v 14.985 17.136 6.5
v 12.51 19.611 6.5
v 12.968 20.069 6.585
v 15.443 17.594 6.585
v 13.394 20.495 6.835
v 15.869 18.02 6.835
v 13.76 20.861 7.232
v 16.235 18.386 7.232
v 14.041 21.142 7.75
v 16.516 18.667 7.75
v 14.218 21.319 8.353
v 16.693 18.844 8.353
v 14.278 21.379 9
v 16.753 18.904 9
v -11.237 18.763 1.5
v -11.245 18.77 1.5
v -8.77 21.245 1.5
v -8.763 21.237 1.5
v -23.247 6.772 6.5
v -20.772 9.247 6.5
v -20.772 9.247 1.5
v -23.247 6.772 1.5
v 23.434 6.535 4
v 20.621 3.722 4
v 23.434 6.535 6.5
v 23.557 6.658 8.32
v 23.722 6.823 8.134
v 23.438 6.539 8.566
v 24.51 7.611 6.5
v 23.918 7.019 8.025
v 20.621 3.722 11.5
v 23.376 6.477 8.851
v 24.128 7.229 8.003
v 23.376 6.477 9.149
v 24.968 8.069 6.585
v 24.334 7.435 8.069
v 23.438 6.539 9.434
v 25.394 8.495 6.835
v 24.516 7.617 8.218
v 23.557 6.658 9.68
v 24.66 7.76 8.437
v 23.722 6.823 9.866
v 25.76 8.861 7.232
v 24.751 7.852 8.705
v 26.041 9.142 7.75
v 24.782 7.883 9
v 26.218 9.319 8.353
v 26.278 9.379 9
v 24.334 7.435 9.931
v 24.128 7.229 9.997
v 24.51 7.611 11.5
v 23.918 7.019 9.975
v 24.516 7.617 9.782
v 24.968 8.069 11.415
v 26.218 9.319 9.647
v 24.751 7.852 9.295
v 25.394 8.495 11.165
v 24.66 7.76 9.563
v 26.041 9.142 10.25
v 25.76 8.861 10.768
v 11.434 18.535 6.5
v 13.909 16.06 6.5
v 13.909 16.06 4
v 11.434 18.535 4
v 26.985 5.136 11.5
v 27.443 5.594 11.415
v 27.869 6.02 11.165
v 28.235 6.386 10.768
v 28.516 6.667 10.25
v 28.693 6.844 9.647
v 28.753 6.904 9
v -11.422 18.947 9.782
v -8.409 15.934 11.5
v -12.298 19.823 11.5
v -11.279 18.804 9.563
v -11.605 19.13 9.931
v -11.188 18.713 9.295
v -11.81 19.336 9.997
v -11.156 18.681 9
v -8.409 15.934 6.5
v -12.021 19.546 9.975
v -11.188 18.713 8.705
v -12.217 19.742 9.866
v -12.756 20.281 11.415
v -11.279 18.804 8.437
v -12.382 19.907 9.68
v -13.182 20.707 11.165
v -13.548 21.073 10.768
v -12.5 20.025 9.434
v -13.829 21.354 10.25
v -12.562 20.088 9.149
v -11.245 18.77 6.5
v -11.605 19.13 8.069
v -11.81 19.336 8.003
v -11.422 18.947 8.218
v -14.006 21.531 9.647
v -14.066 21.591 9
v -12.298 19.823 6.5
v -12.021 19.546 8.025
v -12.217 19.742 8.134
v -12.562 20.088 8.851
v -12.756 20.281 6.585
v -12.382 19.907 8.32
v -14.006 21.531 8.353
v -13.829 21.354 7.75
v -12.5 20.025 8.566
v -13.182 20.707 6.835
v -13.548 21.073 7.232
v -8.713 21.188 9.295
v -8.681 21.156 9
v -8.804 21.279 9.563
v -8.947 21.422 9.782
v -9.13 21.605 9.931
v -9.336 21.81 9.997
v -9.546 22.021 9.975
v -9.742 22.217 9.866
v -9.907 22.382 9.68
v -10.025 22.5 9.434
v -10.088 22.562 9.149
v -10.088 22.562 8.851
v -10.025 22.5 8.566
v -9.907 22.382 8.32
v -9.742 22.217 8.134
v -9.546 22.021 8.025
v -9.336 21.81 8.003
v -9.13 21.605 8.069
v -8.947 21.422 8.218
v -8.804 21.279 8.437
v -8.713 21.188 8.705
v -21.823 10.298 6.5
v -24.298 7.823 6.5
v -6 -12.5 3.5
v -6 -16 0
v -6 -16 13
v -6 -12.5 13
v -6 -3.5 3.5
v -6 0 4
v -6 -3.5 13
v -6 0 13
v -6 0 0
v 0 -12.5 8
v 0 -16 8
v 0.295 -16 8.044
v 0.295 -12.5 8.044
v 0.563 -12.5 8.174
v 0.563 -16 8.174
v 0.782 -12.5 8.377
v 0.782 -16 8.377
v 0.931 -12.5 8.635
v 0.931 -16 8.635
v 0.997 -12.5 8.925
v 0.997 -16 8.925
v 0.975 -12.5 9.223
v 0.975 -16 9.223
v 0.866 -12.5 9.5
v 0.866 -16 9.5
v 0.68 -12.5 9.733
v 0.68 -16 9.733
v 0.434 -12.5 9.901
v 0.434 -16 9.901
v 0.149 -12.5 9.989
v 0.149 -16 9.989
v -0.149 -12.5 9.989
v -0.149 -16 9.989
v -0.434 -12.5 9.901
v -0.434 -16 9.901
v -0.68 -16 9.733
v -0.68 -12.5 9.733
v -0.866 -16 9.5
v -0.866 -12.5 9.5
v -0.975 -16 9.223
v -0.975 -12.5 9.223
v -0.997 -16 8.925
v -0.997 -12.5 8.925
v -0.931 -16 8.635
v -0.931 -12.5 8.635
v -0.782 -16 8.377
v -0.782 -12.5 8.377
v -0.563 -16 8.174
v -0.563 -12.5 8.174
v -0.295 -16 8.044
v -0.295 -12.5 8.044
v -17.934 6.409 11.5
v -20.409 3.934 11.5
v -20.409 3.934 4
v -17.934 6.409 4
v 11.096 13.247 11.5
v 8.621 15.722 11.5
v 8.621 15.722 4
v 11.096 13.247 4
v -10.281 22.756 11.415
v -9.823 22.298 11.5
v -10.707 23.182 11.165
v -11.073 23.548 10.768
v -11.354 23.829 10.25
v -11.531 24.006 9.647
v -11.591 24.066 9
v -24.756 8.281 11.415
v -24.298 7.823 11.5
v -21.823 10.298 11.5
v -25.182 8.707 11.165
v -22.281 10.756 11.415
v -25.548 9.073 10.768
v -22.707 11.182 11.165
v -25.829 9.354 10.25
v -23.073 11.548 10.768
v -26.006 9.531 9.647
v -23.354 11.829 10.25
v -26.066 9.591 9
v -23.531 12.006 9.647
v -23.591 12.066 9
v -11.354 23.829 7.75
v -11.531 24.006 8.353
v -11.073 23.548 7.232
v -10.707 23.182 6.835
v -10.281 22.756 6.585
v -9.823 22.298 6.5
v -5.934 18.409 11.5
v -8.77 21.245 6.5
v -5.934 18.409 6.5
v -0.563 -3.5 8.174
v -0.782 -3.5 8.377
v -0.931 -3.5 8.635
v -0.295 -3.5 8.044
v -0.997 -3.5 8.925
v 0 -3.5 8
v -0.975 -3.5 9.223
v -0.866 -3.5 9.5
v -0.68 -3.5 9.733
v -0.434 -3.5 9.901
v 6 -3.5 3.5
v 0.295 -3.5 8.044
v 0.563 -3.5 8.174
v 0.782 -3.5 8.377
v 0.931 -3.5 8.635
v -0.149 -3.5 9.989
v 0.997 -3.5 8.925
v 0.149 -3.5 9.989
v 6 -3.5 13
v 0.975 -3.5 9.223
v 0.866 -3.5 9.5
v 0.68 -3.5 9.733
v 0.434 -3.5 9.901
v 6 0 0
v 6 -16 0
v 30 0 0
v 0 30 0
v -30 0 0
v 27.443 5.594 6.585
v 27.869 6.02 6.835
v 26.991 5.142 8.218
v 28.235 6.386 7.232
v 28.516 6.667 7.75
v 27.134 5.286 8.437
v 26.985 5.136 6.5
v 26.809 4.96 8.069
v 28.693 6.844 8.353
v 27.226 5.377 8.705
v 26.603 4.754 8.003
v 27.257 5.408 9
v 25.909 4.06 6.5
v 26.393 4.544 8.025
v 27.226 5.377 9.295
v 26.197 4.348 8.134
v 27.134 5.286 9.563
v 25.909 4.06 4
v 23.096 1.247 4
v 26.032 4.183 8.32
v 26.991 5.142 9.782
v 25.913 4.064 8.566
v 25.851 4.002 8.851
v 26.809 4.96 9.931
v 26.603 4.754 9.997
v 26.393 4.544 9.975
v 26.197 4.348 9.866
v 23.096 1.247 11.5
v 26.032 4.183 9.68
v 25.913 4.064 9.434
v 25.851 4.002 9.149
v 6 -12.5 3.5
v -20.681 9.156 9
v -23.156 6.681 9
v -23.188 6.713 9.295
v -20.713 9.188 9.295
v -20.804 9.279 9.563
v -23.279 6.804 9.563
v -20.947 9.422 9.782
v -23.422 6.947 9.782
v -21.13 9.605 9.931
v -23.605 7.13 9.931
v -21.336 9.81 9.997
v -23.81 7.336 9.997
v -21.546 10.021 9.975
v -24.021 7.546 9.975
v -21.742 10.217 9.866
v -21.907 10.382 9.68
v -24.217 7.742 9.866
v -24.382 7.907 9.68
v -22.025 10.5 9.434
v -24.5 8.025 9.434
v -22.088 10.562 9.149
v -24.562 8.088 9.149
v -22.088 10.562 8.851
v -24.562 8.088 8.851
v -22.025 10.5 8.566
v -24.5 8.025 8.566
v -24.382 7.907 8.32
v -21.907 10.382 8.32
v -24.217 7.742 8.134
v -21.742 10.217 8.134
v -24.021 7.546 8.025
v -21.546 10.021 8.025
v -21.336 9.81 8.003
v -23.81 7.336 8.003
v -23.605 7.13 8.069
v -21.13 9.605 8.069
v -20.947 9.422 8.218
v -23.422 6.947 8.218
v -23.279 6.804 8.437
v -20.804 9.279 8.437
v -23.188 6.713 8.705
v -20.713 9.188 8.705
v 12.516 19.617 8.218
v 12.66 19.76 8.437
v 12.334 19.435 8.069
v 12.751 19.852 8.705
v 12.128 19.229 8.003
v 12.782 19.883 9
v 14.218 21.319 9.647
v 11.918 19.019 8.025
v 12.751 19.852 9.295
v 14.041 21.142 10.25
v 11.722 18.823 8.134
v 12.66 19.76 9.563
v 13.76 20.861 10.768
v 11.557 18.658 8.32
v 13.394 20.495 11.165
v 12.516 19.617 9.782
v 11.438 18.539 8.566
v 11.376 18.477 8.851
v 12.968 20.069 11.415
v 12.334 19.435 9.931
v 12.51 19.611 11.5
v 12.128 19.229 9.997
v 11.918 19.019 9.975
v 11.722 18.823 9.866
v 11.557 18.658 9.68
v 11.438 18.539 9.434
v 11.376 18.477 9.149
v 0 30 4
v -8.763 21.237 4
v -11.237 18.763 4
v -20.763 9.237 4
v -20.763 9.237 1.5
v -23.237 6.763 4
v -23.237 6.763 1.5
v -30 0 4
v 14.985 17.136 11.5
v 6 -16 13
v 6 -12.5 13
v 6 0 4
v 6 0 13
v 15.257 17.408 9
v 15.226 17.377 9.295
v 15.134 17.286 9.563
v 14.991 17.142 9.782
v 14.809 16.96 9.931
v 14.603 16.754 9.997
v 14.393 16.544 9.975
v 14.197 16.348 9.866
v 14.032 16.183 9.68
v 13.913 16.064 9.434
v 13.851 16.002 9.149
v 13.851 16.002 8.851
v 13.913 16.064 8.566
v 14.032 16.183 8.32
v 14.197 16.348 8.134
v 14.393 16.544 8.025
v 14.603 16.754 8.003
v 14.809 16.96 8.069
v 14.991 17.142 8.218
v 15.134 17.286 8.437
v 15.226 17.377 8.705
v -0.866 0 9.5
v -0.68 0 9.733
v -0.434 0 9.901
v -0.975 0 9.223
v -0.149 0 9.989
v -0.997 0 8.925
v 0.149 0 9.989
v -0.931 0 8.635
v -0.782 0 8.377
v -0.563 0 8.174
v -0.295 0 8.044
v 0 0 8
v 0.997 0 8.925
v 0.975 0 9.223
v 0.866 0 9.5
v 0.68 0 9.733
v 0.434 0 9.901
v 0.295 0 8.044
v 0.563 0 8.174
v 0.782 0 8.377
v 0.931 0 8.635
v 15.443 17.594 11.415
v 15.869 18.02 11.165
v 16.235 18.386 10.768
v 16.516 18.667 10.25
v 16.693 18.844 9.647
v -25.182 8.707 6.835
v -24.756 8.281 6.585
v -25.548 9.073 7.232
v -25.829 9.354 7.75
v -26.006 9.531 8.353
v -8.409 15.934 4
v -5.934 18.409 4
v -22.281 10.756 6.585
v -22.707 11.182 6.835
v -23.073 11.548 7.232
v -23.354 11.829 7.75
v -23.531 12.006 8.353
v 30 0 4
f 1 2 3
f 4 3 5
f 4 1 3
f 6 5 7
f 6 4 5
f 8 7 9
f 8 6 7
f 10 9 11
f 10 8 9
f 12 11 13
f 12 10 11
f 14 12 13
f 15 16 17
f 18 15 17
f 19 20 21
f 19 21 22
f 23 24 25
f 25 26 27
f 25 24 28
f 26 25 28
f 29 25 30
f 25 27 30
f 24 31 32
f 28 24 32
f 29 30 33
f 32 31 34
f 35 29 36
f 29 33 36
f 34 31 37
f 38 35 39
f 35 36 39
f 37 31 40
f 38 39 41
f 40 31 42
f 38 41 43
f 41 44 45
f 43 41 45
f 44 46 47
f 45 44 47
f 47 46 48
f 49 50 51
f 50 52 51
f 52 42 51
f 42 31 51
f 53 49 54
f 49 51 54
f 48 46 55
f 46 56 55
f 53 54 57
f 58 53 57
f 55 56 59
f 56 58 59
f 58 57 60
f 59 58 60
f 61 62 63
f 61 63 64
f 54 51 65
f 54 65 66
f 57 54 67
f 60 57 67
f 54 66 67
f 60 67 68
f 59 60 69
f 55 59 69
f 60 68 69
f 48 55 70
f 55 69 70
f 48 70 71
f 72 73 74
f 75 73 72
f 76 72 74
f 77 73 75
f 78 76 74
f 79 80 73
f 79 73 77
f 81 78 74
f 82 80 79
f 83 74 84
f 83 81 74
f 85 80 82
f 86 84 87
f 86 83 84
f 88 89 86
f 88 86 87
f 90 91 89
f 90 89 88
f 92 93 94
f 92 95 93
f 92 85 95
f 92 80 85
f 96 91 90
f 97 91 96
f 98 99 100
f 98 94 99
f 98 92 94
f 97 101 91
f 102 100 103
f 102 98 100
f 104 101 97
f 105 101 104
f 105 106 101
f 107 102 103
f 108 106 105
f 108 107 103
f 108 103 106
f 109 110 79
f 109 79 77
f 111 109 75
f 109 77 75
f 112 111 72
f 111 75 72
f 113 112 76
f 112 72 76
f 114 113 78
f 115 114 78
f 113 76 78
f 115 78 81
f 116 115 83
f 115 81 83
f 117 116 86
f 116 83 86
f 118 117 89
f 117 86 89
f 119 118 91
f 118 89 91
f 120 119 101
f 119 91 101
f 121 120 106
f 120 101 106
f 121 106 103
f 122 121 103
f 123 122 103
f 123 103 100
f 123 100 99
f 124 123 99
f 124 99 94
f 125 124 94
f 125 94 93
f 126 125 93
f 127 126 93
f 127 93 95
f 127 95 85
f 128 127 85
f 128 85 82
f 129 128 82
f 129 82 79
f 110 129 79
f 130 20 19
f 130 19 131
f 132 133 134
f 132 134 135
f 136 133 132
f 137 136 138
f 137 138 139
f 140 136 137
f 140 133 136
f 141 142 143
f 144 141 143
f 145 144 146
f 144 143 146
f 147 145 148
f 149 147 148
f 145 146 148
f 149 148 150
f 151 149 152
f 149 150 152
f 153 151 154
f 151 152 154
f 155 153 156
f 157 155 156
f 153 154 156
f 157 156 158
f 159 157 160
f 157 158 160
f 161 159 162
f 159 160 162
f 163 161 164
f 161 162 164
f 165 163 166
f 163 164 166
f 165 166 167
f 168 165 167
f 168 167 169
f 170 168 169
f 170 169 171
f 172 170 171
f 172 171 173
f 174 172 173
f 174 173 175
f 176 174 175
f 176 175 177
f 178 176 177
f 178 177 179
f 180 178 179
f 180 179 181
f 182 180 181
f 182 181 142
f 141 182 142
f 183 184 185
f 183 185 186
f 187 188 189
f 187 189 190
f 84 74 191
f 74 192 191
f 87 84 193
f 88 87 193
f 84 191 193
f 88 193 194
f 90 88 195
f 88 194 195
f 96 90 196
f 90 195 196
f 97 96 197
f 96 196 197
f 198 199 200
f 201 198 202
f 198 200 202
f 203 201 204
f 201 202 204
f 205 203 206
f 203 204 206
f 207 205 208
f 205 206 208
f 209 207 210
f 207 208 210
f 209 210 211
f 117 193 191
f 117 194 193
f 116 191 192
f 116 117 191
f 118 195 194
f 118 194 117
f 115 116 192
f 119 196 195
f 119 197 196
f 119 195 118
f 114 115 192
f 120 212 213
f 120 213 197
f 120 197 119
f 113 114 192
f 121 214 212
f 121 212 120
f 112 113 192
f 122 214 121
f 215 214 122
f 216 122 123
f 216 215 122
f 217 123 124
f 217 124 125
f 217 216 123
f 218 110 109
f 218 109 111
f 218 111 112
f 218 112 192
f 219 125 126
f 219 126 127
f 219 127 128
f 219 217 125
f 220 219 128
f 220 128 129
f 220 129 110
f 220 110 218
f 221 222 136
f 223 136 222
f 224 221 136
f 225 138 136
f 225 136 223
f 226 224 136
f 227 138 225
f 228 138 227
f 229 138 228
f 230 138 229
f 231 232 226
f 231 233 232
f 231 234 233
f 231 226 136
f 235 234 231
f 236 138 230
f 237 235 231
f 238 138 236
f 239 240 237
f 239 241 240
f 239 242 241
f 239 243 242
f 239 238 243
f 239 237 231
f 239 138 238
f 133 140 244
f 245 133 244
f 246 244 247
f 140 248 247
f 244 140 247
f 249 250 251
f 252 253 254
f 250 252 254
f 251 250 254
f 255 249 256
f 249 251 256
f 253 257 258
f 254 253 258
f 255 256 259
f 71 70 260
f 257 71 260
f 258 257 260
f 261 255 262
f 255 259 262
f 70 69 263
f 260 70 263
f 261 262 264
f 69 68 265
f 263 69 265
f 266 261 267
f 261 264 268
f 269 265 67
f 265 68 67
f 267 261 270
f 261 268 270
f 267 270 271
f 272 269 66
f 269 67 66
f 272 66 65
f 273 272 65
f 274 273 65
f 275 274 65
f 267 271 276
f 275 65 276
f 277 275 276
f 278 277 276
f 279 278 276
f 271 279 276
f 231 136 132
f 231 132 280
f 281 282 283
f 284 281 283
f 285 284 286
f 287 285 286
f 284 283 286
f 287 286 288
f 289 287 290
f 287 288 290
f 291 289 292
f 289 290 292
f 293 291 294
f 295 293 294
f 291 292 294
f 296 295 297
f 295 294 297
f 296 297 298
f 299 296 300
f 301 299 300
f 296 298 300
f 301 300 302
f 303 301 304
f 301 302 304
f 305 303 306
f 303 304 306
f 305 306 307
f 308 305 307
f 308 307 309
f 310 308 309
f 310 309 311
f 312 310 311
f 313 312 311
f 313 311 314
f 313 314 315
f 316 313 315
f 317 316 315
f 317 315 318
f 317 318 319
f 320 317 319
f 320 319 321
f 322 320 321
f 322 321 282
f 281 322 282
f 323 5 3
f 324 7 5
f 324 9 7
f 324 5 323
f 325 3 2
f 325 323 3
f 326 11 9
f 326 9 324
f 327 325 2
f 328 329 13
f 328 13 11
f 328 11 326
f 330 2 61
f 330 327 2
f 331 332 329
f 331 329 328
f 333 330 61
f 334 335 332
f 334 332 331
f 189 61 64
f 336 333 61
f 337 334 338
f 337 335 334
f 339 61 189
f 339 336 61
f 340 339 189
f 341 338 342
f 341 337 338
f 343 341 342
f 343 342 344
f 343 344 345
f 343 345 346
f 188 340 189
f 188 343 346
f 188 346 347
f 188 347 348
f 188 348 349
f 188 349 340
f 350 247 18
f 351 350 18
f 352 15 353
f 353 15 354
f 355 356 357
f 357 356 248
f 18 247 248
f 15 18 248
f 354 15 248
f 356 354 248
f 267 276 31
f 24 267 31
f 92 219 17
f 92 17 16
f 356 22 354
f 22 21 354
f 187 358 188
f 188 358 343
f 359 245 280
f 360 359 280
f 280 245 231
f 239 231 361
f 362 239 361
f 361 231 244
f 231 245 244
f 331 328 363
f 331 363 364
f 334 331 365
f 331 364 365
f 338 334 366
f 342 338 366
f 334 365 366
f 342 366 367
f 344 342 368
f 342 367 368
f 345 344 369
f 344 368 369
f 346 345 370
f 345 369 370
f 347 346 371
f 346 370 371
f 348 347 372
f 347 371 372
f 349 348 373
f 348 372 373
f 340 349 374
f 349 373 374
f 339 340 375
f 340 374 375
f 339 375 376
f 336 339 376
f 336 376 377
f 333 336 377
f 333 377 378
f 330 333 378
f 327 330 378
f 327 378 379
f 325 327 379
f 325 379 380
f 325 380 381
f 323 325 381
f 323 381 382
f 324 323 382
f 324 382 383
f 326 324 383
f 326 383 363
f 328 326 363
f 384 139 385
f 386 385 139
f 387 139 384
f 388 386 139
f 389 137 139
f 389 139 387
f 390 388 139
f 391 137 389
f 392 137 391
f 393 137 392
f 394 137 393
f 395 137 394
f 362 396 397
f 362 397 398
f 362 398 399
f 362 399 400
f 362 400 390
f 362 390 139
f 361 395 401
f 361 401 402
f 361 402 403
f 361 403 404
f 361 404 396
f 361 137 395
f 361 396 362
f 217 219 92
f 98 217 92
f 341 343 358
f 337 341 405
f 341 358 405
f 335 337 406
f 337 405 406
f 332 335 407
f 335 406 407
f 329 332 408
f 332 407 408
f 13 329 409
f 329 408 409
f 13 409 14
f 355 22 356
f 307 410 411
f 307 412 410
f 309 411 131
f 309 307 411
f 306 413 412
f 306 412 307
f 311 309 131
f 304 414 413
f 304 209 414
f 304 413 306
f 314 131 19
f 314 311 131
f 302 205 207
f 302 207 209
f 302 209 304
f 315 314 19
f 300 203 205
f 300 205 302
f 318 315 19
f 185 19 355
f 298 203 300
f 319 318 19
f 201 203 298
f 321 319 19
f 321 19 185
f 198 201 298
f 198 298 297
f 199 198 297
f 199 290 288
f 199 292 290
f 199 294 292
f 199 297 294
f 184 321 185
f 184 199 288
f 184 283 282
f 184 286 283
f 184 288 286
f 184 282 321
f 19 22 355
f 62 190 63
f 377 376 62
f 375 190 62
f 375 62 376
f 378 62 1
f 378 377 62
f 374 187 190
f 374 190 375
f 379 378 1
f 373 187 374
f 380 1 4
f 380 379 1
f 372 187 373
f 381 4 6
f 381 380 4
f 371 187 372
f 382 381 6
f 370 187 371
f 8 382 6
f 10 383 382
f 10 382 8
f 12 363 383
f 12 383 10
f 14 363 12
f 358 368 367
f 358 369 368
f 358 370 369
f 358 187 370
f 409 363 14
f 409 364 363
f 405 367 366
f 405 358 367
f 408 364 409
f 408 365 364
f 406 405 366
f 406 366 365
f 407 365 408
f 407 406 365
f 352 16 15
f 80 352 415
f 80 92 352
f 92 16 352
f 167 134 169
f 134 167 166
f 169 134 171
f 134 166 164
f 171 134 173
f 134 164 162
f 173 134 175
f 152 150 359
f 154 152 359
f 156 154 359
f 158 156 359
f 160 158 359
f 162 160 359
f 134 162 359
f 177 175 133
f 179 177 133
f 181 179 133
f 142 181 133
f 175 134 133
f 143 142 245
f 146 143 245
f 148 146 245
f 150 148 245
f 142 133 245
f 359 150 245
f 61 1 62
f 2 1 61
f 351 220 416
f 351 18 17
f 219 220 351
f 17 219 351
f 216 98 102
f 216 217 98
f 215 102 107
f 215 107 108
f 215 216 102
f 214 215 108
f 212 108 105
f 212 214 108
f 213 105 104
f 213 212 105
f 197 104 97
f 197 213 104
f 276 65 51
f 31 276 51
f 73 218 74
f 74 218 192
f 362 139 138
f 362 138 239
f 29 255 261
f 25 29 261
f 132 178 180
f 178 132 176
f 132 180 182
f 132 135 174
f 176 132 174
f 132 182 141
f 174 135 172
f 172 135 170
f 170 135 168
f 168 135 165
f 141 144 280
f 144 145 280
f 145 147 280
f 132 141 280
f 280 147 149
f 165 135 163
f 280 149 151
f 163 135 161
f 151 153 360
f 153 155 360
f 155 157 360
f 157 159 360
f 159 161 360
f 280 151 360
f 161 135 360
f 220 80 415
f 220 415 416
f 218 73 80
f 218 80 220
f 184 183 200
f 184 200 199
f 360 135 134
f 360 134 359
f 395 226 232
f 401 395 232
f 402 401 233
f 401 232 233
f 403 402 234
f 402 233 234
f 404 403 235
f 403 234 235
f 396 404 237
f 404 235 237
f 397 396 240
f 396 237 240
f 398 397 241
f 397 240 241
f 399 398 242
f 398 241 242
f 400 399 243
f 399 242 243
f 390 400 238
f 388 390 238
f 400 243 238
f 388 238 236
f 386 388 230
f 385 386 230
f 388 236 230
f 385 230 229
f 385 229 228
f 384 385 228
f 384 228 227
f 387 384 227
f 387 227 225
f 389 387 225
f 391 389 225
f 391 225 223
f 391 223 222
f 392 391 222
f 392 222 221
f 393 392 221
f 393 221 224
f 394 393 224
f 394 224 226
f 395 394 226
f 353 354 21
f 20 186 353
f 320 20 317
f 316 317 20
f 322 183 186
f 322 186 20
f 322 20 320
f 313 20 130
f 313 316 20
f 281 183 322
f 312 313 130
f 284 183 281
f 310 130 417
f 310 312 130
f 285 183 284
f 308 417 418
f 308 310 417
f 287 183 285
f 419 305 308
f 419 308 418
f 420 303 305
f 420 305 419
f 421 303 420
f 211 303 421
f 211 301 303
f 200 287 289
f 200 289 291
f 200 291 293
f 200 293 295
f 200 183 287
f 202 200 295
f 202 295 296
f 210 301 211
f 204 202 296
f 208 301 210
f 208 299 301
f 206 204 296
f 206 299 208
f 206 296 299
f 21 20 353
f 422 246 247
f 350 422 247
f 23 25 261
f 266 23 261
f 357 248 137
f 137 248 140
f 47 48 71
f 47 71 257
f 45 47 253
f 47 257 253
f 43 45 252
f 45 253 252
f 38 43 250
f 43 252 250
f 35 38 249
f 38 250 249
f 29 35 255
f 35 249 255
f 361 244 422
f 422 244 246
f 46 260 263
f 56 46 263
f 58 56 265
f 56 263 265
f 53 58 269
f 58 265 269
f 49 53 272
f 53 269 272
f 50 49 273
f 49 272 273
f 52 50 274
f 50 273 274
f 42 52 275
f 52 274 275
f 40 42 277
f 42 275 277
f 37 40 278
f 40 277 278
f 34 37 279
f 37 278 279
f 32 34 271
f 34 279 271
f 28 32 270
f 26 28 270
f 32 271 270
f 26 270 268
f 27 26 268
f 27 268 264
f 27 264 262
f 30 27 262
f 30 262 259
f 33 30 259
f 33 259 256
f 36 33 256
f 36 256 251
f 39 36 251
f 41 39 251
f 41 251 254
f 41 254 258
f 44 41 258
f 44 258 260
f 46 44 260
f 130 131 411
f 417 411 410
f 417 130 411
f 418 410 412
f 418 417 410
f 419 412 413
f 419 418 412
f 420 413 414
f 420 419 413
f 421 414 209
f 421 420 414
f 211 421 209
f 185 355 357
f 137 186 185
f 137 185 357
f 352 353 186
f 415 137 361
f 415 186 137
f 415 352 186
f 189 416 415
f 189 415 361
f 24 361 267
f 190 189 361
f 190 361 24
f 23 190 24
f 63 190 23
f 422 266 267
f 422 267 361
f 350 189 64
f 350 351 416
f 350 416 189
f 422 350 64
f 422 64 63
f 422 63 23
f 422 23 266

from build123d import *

# Parameters (mm, degrees)
BOSS_EXTRUDE1_DEPTH   = 4
BOSS_EXTRUDE2_START   = -4
SKETCH2_W             = 12
SKETCH2_H             = 16
BOSS_EXTRUDE2_DEPTH   = 13
SKETCH3_W             = 12
SKETCH3_H             = 9
CUT_EXTRUDE1_DEPTH    = 9.5
SKETCH4_R             = 1
CUT_EXTRUDE2_DEPTH    = 16
BOSS_EXTRUDE3_START   = 2.5
BOSS_EXTRUDE3_DEPTH   = 5
BOSS_EXTRUDE3_2_DEPTH = 5
BOSS_EXTRUDE3_3_DEPTH = 5
BOSS_EXTRUDE3_4_DEPTH = 5
BOSS_EXTRUDE4_DEPTH   = 10
SKETCH6_R             = 1
CUT_EXTRUDE5_DEPTH    = 25
SKETCH7_R             = 1
CUT_EXTRUDE6_DEPTH    = 25
FILLET2_R             = 2.5


with BuildPart() as part:
    # Sketch1 → Boss-Extrude1 (new body)
    with BuildSketch(Plane.XY):
        Polygon((-30, 0), (30, 0), (0, 30), align=None)
    extrude(amount=BOSS_EXTRUDE1_DEPTH)

    # Sketch2 → Boss-Extrude2 (add)
    with BuildSketch(Plane.XY.offset(4).offset(BOSS_EXTRUDE2_START)):
        with Locations((0, -8)):
            Rectangle(SKETCH2_W, SKETCH2_H)
    extrude(amount=BOSS_EXTRUDE2_DEPTH)

    # Sketch3 → Cut-Extrude1 (cut)
    with BuildSketch(Plane.XY.offset(13)):
        with Locations((0, -8)):
            Rectangle(SKETCH3_W, SKETCH3_H)
    extrude(amount=-CUT_EXTRUDE1_DEPTH, mode=Mode.SUBTRACT)

    # Sketch4 → Cut-Extrude2 (cut)
    with BuildSketch(Plane.XZ.offset(16)):
        with Locations(Location((0, 9, 0), (0, 0, 270))):
            Circle(SKETCH4_R)
    extrude(amount=-CUT_EXTRUDE2_DEPTH, mode=Mode.SUBTRACT)



with BuildPart() as body_2:
    # Sketch5 → Boss-Extrude3 (new body)
    with BuildSketch(Plane.XY.offset(4).offset(BOSS_EXTRUDE3_START)):
        Polygon((-8.409009742, 15.934136008), (-14.065863992, 21.590990258), (-11.590990258, 24.065863992), (-5.934136008, 18.409009742), align=None)
    extrude(amount=BOSS_EXTRUDE3_DEPTH)


with BuildPart() as body_3:
    # Sketch5 → Boss-Extrude3 2 (new body)
    with BuildSketch(Plane.XY.offset(4).offset(BOSS_EXTRUDE3_START)):
        Polygon((-20.409009742, 3.934136008), (-26.065863992, 9.590990258), (-23.590990258, 12.065863992), (-17.934136008, 6.409009742), align=None)
    extrude(amount=BOSS_EXTRUDE3_2_DEPTH)


with BuildPart() as body_4:
    # Sketch5 → Boss-Extrude3 3 (new body)
    with BuildSketch(Plane.XY.offset(4).offset(BOSS_EXTRUDE3_START)):
        Polygon((8.621141777, 15.722003974), (14.277996026, 21.378858223), (16.75286976, 18.903984489), (11.096015511, 13.24713024), align=None)
    extrude(amount=BOSS_EXTRUDE3_3_DEPTH)


with BuildPart() as body_5:
    # Sketch5 → Boss-Extrude3 4 (new body)
    with BuildSketch(Plane.XY.offset(4).offset(BOSS_EXTRUDE3_START)):
        Polygon((20.621141777, 3.722003974), (26.277996026, 9.378858223), (28.75286976, 6.903984489), (23.096015511, 1.24713024), align=None)
    extrude(amount=BOSS_EXTRUDE3_4_DEPTH)


with BuildPart() as part_1:
    add(part.part)

    add(body_2.part)  # Boss-Extrude4 merges body 2

    add(body_3.part)  # Boss-Extrude4 merges body 3

    add(body_4.part)  # Boss-Extrude4 merges body 4

    add(body_5.part)  # Boss-Extrude4 merges body 5
    # Sketch8 → Boss-Extrude4 (add)
    with BuildSketch(Plane.XY.offset(11.5)):
        Polygon((-20.409009742, 3.934136008), (-17.934136008, 6.409009742), (-20.77228069, 9.247154424), (-23.247154424, 6.77228069), align=None)
        Polygon((-8.409009742, 15.934136008), (-5.934136008, 18.409009742), (-8.770090905, 21.24496464), (-11.24496464, 18.770090905), align=None)
        Polygon((8.621141777, 15.722003974), (11.096015511, 13.24713024), (13.908555635, 16.059670364), (11.433681901, 18.534544098), align=None)
        Polygon((23.096015511, 1.24713024), (20.621141777, 3.722003974), (23.433669477, 6.534531674), (25.908543211, 4.05965794), align=None)
    extrude(amount=-BOSS_EXTRUDE4_DEPTH)

    # Sketch6 → Cut-Extrude5 (cut)
    with BuildSketch(Plane(origin=(10.924442636, -10.924442636, 0), x_dir=(0.7071067811865506, 0.7071067811865446, 0), z_dir=(0.7071067811865446, -0.7071067811865506, 0))):
        with Locations((22.098203436, 9)):
            Circle(SKETCH6_R)
    extrude(amount=-CUT_EXTRUDE5_DEPTH, mode=Mode.SUBTRACT)

    # Sketch7 → Cut-Extrude6 (cut)
    with BuildSketch(Plane(origin=(-8.237436867, -8.237436867, 0), x_dir=(0, 0, 1), z_dir=(-0.7071067811865501, -0.7071067811865449, 0))):
        with Locations(Location((9, 22.098203436, 0), (0, 0, 270))):
            Circle(SKETCH7_R)
    extrude(amount=-CUT_EXTRUDE6_DEPTH, mode=Mode.SUBTRACT)

    # Fillet2
    fillet2_edges = [part_1.edges().sort_by_distance(p)[0] for p in [
        (15.515432893, 20.141421356, 11.5),
        (15.515432893, 20.141421356, 6.5),
        (27.515432893, 8.141421356, 6.5),
        (27.515432893, 8.141421356, 11.5),
        (-24.828427125, 10.828427125, 6.5),
        (-12.828427125, 22.828427125, 6.5),
        (-12.828427125, 22.828427125, 11.5),
        (-24.828427125, 10.828427125, 11.5),
    ]]
    fillet(fillet2_edges, radius=FILLET2_R - 0.0001)  # a hair under: the kernel refuses the full size


solid = part_1.part
